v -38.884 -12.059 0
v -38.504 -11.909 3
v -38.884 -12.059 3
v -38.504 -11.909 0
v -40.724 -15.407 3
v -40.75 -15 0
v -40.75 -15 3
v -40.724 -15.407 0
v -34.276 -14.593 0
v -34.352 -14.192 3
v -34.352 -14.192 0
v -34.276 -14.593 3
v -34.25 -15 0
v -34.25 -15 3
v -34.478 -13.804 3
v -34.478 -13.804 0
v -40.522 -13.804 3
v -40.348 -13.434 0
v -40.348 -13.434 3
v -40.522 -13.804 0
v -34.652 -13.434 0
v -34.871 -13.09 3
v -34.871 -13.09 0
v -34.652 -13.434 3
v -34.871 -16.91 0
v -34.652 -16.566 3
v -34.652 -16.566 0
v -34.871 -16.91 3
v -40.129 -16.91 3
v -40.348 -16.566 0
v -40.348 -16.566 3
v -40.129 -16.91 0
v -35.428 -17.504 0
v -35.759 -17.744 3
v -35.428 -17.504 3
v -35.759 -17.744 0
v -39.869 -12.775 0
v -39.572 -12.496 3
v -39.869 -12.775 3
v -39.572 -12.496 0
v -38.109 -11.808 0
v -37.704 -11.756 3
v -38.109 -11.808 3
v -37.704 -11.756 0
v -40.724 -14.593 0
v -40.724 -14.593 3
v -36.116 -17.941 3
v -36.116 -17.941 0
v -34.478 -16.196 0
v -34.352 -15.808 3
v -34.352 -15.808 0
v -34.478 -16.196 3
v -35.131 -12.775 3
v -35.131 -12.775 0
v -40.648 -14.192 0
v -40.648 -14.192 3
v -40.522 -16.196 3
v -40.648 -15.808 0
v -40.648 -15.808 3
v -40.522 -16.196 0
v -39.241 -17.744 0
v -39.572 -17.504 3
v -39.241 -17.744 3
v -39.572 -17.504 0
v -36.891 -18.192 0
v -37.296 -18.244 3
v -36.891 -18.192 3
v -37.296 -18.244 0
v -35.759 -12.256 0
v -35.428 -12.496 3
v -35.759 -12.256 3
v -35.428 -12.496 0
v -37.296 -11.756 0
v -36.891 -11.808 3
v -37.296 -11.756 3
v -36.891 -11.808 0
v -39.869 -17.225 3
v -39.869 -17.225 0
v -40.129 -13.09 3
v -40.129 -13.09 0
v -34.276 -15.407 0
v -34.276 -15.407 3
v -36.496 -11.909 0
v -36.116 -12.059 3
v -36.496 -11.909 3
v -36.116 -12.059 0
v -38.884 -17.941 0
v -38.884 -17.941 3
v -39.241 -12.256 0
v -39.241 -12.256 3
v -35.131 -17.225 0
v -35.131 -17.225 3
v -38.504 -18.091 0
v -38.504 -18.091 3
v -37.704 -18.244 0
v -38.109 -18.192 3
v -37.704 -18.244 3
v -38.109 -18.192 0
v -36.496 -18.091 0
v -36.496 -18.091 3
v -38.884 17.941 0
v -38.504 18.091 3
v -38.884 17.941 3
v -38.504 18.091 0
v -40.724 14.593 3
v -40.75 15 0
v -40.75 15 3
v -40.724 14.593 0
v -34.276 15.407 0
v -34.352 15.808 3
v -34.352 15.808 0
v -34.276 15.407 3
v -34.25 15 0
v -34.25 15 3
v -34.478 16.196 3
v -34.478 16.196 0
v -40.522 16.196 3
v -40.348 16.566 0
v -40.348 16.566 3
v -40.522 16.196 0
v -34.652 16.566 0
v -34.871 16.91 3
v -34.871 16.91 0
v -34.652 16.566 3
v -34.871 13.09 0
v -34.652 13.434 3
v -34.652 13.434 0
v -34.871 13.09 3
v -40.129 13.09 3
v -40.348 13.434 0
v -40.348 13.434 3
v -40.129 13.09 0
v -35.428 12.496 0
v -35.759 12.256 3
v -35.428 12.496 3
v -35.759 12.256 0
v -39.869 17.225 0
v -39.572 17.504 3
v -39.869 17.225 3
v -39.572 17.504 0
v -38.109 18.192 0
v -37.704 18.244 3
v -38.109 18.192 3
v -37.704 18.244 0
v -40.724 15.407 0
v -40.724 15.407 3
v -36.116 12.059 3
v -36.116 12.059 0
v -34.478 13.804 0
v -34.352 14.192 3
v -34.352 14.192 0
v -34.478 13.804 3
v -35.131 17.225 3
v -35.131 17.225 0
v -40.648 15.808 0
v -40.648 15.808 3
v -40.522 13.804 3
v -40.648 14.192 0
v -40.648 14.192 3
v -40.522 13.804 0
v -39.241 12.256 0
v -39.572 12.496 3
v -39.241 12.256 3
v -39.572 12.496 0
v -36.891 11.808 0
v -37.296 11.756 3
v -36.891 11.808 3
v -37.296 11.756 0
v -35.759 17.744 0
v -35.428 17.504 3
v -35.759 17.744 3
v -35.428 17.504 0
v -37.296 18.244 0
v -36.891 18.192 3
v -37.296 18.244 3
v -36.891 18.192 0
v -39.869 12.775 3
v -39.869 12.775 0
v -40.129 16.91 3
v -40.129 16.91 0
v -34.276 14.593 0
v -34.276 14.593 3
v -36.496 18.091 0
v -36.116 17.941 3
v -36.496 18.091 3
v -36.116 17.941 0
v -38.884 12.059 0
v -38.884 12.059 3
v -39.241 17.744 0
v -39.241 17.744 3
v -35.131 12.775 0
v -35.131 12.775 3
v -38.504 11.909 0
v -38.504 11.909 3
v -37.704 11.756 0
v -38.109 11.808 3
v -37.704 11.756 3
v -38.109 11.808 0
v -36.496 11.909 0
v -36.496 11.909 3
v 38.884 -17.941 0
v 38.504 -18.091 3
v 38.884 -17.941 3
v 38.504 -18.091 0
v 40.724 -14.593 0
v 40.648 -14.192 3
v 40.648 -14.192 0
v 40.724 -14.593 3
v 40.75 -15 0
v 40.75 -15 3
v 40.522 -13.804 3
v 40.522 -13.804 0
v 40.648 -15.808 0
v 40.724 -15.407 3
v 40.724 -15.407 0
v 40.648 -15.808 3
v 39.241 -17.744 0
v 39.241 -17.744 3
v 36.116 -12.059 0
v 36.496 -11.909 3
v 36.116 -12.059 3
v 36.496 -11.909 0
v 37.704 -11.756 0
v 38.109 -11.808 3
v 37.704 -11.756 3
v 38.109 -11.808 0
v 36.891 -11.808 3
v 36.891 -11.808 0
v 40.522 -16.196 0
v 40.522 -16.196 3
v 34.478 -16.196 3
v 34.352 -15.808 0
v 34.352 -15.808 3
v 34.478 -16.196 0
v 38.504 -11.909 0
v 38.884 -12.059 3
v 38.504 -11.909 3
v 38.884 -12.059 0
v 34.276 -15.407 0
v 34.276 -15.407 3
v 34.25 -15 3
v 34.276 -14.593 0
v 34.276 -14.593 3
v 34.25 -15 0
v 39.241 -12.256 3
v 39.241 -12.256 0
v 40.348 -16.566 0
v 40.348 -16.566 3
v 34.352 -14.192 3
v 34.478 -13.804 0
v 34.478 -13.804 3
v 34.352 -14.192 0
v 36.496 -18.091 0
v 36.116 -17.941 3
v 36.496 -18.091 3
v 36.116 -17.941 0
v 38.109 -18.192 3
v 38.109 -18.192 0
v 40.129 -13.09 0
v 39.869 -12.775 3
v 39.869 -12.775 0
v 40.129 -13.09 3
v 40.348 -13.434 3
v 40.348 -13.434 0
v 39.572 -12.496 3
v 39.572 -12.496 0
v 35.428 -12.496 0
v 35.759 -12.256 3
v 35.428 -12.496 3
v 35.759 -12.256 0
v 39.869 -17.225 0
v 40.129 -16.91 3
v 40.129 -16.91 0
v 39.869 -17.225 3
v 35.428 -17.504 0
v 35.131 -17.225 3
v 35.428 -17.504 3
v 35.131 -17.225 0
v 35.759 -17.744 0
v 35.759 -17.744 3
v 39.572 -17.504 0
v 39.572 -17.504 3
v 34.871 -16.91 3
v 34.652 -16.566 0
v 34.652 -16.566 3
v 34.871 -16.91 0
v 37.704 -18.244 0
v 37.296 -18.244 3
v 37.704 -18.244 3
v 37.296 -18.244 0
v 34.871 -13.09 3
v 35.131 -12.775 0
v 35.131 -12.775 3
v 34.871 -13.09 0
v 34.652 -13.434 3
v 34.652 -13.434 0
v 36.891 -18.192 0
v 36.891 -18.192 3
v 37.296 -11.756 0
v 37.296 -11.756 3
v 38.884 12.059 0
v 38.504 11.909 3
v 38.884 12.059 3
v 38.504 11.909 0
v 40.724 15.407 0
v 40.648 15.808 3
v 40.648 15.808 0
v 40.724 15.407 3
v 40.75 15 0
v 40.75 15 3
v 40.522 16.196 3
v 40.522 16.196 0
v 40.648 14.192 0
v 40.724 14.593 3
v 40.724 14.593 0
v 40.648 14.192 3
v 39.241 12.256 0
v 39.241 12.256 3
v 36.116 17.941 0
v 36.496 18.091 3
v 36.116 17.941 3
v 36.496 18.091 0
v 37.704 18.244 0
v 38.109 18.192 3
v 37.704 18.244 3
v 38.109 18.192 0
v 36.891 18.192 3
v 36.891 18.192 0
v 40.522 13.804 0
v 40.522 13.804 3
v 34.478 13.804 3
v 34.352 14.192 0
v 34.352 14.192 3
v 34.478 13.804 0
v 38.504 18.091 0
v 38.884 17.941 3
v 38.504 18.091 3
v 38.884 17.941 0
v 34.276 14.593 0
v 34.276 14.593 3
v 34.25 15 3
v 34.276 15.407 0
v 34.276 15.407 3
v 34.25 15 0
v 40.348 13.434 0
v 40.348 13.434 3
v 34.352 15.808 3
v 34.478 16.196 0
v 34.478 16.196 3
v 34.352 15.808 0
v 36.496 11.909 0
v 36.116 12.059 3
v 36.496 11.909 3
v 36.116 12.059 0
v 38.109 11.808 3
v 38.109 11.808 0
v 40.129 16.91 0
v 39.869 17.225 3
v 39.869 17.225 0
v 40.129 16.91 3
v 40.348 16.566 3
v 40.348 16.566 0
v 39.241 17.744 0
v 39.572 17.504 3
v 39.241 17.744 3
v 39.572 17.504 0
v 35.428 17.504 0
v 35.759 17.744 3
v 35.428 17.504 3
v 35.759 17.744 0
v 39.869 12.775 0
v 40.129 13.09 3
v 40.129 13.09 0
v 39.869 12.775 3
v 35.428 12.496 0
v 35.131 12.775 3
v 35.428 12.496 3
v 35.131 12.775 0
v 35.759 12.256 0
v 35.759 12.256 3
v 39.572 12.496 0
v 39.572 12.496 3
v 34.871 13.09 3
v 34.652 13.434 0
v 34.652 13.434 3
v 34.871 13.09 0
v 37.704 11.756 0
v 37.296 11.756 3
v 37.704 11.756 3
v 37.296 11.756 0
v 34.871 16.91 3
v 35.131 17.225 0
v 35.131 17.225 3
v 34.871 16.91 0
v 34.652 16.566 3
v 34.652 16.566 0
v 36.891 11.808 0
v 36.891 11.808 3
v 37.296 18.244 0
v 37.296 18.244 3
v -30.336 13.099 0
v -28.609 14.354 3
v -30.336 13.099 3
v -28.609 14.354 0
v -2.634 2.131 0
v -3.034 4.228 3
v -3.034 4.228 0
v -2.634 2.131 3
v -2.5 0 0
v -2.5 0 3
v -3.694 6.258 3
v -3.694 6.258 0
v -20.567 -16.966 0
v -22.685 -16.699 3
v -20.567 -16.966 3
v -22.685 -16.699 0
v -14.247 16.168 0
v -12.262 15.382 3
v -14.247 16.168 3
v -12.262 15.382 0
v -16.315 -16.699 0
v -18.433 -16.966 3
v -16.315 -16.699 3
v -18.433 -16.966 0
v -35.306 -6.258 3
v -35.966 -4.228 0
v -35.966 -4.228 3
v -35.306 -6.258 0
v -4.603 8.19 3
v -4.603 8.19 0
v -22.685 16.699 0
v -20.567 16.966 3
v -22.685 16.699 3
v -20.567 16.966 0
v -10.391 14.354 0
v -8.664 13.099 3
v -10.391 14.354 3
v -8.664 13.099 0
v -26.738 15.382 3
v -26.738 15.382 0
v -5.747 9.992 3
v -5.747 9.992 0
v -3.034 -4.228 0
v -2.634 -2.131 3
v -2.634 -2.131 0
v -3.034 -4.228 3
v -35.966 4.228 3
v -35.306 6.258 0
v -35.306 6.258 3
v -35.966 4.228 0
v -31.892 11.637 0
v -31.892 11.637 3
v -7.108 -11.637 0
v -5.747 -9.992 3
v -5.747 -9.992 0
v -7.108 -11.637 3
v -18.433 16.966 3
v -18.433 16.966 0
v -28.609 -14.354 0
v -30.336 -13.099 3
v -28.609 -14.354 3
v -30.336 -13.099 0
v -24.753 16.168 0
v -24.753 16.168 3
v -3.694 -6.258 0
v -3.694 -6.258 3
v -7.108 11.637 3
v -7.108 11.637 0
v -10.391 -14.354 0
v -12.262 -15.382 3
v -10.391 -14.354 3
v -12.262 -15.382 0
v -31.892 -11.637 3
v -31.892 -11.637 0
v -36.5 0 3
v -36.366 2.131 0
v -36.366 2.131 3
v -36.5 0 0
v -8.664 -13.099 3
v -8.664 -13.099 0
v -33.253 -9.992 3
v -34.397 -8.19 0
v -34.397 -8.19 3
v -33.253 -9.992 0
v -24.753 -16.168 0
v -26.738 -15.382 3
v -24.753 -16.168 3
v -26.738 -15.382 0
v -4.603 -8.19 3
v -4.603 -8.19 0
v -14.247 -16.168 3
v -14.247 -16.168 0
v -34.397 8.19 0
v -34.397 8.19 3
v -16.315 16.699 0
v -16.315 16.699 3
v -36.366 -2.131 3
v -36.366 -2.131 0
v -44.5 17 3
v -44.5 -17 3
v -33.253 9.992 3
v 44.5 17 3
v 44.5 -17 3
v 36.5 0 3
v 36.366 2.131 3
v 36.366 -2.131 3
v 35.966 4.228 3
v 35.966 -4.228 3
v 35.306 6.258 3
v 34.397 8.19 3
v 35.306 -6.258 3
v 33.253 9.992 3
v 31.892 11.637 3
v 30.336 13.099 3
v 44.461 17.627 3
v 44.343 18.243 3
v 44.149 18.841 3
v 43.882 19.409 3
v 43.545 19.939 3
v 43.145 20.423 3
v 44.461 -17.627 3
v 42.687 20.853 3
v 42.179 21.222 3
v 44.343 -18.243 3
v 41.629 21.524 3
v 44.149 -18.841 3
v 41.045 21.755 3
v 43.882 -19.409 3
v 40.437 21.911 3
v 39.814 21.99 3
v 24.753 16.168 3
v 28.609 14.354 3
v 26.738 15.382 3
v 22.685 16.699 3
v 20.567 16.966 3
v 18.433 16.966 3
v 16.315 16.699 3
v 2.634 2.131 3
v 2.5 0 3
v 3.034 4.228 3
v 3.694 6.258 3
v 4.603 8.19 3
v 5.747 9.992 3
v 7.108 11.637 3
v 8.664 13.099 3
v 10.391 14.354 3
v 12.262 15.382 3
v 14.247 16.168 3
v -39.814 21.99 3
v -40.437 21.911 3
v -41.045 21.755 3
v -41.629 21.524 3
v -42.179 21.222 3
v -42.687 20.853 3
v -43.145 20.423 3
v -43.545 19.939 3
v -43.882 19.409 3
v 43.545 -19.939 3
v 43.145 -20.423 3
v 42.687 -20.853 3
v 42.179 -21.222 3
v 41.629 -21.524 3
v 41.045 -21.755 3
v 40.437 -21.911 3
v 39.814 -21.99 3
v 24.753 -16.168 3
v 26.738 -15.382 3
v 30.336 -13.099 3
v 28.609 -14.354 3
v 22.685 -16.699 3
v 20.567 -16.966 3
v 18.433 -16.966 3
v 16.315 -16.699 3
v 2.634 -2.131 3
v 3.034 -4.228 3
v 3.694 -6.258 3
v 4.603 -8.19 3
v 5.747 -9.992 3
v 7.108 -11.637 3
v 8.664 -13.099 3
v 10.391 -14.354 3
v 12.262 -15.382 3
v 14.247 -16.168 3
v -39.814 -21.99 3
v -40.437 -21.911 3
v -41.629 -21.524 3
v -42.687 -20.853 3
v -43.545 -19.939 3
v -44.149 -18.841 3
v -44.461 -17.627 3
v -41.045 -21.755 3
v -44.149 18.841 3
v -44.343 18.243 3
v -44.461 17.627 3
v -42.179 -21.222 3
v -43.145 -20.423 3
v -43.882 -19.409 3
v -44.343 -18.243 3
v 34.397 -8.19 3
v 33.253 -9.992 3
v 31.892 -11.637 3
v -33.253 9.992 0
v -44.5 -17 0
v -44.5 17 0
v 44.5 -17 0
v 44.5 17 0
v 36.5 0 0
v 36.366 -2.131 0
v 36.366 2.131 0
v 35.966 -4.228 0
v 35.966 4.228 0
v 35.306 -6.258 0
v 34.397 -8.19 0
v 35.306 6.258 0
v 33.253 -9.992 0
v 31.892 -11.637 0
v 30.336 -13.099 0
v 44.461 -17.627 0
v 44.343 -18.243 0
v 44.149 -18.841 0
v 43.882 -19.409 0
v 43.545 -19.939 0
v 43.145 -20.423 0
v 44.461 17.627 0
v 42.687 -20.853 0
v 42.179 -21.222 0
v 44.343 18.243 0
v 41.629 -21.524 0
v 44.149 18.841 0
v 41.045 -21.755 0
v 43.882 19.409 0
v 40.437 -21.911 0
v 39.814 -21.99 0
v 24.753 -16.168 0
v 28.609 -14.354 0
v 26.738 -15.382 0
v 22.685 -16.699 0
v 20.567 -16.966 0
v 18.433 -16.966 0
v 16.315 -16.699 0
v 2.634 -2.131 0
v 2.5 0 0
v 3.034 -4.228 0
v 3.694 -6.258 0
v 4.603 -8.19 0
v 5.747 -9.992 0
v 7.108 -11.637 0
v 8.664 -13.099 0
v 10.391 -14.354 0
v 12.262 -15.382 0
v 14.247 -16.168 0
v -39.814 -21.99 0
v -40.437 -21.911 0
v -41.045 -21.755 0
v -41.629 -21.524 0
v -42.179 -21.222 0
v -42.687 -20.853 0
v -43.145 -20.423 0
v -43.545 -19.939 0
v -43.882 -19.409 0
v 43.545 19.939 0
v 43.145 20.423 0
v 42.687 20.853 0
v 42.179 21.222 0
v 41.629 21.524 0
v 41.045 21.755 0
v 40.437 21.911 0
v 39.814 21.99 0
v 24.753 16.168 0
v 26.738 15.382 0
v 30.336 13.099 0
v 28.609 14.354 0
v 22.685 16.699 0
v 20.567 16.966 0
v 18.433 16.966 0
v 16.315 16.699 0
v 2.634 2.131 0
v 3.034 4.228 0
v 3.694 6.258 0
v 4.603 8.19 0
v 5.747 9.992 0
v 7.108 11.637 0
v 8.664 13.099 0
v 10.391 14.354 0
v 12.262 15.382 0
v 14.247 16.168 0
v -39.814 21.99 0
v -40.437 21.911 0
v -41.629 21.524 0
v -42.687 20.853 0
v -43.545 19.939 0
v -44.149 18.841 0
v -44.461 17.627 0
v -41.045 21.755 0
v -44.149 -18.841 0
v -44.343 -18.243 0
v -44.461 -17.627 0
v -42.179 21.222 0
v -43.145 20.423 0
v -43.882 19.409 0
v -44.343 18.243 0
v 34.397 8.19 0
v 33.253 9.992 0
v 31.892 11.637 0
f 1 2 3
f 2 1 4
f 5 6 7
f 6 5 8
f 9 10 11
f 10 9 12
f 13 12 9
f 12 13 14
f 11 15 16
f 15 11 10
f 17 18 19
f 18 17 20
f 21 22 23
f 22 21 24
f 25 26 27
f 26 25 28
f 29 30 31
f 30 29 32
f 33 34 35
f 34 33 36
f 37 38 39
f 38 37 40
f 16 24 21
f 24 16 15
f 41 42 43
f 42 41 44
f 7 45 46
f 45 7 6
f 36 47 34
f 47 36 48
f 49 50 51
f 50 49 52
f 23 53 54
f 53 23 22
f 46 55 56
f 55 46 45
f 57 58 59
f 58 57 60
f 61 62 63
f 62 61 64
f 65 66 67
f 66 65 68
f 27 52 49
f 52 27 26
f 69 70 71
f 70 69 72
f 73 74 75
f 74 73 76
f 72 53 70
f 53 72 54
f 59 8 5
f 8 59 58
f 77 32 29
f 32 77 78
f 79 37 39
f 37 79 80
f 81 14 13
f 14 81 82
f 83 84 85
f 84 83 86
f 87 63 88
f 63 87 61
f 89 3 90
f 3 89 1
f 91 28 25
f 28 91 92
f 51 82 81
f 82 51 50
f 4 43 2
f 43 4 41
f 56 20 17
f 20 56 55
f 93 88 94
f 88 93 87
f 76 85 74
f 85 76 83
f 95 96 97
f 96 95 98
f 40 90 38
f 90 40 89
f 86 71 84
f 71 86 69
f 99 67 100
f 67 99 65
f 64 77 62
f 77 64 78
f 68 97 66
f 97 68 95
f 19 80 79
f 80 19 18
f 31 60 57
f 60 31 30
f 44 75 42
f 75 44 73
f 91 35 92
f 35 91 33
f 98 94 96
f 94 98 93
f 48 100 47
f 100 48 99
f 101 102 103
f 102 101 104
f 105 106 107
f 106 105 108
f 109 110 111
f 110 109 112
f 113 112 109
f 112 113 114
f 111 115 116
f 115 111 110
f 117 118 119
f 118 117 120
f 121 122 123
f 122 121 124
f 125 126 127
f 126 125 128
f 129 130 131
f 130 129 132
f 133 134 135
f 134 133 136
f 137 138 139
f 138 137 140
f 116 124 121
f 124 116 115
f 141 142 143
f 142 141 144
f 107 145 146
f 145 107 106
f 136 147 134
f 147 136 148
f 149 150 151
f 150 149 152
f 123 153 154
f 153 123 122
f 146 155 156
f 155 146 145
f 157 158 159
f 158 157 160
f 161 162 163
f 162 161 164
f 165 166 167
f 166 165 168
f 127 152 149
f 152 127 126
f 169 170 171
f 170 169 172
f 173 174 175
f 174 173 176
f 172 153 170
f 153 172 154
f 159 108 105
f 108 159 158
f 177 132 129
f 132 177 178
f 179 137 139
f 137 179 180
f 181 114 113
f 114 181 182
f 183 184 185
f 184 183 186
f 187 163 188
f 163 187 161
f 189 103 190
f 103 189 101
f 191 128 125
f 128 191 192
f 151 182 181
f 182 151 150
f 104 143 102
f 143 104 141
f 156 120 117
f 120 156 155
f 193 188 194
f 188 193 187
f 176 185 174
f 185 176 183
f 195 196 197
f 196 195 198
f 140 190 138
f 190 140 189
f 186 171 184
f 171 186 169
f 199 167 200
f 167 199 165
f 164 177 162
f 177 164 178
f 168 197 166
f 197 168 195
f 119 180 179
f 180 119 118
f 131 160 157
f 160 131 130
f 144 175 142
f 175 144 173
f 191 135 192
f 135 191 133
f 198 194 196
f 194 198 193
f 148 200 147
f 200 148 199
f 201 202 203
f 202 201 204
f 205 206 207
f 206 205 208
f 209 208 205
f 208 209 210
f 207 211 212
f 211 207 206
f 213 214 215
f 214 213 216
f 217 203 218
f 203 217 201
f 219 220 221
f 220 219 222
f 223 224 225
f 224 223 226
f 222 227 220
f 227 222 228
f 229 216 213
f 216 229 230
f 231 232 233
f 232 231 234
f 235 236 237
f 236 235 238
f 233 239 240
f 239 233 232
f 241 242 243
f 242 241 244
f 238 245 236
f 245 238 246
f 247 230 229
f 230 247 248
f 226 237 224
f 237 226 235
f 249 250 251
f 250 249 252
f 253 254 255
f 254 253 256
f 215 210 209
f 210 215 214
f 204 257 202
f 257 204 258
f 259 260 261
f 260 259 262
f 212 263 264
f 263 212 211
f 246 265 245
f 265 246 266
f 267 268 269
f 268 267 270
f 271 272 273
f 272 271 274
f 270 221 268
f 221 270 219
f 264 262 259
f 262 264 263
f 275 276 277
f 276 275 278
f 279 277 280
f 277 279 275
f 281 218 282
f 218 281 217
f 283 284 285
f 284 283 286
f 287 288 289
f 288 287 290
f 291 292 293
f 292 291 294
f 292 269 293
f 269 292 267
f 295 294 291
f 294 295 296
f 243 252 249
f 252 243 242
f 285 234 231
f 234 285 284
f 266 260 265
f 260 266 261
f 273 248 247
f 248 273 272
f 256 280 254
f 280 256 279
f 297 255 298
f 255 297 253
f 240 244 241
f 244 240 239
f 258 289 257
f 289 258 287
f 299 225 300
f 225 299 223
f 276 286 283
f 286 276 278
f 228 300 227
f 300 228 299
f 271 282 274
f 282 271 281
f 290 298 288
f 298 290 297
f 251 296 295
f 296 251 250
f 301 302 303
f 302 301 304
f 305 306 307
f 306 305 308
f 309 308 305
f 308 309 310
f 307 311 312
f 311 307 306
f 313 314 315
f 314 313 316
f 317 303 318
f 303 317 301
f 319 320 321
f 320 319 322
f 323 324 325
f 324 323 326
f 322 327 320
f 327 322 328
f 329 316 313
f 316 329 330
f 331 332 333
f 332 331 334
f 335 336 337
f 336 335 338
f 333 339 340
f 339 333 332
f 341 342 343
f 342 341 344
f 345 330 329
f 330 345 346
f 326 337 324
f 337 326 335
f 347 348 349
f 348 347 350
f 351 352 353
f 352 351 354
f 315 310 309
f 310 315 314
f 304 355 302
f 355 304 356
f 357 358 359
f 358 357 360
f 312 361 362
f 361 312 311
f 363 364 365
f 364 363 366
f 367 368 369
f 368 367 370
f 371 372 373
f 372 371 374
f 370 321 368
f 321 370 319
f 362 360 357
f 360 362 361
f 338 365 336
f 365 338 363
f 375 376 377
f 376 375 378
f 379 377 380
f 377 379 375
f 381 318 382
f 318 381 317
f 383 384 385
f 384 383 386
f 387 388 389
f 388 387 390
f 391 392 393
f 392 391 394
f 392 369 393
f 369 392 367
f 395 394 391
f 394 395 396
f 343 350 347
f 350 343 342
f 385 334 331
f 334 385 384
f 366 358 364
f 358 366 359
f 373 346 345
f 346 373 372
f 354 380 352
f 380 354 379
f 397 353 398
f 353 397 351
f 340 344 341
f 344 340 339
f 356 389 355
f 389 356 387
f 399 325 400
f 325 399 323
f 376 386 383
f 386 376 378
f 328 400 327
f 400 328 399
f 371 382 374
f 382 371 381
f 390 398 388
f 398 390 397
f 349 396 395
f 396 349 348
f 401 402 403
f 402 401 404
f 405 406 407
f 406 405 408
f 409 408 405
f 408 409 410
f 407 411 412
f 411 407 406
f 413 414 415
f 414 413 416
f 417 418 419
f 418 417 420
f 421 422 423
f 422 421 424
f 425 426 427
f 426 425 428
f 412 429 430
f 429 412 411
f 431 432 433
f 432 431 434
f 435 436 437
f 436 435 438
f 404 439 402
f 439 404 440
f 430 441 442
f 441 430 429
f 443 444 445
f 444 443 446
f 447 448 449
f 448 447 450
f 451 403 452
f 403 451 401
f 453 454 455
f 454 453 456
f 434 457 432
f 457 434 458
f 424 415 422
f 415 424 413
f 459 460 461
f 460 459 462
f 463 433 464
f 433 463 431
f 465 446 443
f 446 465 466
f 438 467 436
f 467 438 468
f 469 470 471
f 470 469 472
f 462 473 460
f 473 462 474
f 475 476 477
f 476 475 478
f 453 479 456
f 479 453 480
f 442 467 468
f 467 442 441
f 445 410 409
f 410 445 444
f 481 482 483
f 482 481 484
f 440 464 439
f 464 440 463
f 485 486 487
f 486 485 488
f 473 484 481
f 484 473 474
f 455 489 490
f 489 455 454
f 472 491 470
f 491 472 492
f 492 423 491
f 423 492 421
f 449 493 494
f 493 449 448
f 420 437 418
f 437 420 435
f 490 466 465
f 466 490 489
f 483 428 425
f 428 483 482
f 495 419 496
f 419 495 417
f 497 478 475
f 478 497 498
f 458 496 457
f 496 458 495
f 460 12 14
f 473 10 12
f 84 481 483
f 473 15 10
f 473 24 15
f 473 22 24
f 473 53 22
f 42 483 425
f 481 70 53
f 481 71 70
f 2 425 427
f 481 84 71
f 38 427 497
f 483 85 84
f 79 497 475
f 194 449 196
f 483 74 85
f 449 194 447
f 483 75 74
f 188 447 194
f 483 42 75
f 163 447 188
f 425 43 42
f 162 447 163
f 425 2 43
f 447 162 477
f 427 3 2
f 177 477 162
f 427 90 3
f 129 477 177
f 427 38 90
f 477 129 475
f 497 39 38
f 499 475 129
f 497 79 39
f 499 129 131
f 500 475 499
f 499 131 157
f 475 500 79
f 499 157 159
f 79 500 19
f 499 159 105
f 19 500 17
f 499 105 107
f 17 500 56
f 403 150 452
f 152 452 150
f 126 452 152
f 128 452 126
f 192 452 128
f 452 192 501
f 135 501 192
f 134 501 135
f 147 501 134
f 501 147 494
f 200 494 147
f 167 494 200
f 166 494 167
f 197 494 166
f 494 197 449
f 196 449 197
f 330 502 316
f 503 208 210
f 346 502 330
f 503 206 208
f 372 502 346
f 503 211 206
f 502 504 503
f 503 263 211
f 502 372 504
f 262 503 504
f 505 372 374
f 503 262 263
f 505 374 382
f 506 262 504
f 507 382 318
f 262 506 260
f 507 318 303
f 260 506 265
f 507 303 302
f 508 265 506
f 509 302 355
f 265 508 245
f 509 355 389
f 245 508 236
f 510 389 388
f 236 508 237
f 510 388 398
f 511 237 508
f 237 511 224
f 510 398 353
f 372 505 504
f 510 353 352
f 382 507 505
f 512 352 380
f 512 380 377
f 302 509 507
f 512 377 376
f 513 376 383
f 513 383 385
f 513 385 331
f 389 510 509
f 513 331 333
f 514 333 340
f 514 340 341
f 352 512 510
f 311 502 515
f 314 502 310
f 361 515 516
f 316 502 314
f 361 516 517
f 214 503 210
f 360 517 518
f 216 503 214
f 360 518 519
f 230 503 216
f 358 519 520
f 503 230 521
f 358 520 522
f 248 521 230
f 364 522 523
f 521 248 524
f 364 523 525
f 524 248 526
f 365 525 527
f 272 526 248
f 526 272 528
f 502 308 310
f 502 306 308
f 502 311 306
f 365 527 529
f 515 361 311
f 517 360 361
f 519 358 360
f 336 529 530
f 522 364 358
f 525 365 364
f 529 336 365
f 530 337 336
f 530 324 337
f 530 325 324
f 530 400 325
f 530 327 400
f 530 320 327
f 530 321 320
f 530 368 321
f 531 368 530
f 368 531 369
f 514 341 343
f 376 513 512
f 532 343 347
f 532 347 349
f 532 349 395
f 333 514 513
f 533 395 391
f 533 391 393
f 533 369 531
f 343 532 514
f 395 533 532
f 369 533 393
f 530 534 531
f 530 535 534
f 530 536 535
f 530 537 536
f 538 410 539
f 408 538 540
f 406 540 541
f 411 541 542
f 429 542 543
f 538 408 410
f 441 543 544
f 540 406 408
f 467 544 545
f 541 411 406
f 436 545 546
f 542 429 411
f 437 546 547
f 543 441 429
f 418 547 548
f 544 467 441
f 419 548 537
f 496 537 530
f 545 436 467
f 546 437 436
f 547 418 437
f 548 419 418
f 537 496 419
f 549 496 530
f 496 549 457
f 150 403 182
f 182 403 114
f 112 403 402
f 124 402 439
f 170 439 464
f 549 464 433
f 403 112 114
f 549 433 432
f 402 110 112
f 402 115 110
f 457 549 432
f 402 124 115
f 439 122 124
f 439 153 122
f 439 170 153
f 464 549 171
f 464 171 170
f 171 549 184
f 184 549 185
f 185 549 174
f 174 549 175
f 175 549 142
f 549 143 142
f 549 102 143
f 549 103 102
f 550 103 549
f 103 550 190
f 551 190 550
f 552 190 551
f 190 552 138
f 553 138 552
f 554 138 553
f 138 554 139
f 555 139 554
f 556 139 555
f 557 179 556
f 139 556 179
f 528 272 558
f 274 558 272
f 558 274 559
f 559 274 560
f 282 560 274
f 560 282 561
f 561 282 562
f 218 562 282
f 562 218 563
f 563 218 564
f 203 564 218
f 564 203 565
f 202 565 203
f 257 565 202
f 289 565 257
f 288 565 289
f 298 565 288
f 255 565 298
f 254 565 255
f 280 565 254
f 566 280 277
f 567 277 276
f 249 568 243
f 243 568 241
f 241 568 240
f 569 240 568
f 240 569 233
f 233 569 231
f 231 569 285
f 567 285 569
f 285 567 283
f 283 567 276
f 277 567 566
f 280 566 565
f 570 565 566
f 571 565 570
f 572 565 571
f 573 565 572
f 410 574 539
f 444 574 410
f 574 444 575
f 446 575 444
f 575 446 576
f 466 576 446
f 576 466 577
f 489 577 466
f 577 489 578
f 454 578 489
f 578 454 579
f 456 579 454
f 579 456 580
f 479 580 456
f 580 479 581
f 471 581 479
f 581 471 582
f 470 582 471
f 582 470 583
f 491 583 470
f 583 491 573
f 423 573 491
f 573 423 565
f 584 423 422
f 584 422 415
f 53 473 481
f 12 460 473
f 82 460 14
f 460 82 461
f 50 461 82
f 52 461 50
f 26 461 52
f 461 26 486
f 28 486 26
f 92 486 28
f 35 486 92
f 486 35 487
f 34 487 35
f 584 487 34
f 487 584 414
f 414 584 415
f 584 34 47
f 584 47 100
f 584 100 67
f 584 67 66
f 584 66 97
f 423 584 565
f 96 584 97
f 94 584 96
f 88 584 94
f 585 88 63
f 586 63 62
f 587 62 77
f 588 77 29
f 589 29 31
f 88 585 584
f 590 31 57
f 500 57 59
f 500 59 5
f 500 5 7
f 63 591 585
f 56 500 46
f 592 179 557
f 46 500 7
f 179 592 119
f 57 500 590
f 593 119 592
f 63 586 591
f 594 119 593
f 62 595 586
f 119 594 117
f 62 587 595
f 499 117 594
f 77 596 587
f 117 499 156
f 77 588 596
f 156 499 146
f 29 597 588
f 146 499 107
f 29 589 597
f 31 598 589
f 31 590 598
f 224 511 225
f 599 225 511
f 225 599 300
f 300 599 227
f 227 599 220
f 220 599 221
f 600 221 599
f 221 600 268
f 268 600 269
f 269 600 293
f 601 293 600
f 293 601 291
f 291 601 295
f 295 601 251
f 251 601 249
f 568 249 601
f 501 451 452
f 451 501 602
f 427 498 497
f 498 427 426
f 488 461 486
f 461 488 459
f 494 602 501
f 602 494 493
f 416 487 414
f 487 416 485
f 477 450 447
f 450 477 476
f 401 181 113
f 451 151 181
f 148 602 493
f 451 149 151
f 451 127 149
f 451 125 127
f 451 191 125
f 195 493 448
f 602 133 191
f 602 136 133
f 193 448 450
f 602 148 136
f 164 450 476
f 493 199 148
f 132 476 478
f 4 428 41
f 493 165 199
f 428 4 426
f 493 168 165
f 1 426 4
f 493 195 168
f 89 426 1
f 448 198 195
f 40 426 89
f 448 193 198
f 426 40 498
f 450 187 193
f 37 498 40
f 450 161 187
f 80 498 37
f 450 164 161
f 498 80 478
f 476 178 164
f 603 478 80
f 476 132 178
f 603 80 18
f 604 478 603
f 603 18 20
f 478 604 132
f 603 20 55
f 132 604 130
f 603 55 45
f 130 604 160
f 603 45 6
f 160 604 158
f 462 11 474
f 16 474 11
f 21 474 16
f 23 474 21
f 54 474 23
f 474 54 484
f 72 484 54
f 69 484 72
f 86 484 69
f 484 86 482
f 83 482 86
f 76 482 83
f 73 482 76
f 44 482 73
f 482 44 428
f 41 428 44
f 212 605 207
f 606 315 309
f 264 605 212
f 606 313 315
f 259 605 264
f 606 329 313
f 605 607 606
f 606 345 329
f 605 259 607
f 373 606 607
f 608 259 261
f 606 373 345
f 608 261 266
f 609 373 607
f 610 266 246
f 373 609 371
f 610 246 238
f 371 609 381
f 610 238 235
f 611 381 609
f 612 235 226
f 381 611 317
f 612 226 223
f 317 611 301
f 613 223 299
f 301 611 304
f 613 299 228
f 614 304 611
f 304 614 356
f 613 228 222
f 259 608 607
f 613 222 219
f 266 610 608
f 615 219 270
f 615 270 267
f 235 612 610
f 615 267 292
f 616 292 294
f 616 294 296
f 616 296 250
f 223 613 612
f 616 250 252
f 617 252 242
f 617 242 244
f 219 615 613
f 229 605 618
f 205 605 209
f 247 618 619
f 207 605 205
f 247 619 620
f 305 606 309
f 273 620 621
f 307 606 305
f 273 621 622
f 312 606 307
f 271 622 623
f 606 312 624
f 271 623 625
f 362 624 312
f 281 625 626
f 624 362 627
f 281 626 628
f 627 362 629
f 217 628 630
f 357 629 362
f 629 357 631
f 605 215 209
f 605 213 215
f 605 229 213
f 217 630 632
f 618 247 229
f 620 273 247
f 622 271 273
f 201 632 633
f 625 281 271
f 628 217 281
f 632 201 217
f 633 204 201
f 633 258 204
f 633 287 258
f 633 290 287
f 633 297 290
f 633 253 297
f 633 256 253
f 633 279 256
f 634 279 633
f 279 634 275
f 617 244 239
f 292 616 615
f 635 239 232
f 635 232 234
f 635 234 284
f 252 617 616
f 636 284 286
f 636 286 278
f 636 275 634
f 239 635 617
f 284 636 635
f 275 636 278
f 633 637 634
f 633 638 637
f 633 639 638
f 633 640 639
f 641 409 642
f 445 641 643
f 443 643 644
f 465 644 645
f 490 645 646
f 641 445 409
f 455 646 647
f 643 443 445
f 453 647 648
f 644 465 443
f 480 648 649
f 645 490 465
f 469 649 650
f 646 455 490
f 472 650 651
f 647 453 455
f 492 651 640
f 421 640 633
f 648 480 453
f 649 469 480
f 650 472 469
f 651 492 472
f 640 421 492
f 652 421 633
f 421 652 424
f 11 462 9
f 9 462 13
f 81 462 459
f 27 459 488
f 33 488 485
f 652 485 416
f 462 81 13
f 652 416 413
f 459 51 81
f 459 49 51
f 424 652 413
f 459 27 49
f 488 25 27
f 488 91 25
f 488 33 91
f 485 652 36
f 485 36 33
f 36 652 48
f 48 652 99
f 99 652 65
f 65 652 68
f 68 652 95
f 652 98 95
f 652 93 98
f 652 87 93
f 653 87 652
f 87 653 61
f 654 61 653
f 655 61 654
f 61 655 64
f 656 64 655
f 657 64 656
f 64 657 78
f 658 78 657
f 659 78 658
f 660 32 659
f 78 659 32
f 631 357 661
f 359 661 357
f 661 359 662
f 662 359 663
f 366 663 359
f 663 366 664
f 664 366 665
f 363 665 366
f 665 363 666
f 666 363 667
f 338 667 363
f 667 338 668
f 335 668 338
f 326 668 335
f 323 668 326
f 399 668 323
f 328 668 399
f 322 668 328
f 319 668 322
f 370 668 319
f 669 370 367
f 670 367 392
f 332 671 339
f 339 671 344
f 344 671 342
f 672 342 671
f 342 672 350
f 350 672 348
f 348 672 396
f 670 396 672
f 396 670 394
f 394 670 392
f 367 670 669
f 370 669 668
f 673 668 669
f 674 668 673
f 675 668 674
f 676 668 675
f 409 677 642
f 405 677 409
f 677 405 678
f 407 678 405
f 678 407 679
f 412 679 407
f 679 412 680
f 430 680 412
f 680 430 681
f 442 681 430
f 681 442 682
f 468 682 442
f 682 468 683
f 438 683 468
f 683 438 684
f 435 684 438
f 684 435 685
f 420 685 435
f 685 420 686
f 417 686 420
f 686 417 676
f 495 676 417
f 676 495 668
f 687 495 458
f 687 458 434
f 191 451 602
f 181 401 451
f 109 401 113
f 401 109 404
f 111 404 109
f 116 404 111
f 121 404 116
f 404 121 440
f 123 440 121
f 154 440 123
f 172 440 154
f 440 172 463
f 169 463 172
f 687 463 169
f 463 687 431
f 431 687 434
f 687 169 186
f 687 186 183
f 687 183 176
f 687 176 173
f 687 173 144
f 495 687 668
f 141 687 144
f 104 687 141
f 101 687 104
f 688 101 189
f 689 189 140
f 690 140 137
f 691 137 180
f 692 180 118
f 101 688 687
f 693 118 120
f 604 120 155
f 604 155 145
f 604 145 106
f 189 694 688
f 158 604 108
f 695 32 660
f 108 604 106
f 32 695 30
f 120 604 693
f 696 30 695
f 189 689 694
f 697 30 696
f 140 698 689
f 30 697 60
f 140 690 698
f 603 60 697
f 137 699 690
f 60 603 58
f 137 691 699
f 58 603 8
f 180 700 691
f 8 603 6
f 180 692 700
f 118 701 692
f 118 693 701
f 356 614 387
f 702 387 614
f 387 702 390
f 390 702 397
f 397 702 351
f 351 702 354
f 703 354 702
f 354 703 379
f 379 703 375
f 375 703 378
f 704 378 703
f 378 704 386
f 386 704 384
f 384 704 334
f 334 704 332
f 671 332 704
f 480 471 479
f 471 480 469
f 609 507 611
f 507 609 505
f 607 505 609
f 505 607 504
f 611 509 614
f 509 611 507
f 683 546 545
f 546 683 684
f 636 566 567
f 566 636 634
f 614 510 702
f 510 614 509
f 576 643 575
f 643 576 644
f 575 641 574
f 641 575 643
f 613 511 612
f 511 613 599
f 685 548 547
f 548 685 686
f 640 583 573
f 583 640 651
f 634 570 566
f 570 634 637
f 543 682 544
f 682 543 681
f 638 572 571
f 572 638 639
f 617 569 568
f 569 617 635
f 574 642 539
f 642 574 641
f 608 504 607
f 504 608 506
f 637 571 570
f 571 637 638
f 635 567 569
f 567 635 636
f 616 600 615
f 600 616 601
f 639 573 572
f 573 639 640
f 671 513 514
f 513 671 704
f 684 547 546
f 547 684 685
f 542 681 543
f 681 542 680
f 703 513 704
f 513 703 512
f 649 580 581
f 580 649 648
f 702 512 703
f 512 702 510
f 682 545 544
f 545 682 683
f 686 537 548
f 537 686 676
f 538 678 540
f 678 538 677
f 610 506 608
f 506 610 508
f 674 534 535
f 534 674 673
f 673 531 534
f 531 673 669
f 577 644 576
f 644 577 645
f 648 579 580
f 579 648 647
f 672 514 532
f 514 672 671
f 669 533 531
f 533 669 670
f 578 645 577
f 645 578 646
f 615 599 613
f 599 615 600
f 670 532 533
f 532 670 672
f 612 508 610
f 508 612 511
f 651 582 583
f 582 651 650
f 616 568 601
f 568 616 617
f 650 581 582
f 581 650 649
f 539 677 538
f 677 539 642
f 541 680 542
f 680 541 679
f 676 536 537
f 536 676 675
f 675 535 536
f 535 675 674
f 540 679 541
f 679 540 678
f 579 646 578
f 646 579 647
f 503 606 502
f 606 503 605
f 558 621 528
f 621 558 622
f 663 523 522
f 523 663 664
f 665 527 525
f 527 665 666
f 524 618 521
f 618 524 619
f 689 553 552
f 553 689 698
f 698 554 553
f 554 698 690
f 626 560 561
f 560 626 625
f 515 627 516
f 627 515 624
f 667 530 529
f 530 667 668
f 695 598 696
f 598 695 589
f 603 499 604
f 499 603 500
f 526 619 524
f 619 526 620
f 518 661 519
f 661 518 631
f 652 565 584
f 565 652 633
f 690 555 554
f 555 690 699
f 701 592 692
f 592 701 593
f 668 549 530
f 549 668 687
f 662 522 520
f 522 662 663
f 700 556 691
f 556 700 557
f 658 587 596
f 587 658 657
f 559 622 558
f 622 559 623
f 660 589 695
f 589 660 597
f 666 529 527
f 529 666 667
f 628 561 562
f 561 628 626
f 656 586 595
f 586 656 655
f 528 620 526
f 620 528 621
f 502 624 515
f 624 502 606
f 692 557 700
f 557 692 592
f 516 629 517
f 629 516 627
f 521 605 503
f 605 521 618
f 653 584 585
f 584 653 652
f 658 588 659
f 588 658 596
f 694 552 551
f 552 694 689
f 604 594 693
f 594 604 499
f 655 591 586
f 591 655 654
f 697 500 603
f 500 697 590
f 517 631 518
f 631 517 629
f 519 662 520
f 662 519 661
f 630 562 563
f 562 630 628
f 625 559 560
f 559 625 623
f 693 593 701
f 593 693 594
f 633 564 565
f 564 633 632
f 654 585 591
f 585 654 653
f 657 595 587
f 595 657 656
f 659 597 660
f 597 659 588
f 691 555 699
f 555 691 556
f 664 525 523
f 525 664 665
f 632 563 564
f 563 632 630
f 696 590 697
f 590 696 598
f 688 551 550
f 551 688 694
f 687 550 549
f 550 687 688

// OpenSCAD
$fn = 50;


difference() {
	union() {
		hull() {
			translate(v = [-39.5000000000, 17.0000000000, 0]) {
				cylinder(h = 3, r = 5);
			}
			translate(v = [39.5000000000, 17.0000000000, 0]) {
				cylinder(h = 3, r = 5);
			}
			translate(v = [-39.5000000000, -17.0000000000, 0]) {
				cylinder(h = 3, r = 5);
			}
			translate(v = [39.5000000000, -17.0000000000, 0]) {
				cylinder(h = 3, r = 5);
			}
		}
	}
	union() {
		#translate(v = [-37.5000000000, -15.0000000000, -100.0000000000]) {
			cylinder(h = 200, r = 3.2500000000);
		}
		#translate(v = [-37.5000000000, 15.0000000000, -100.0000000000]) {
			cylinder(h = 200, r = 3.2500000000);
		}
		#translate(v = [37.5000000000, -15.0000000000, -100.0000000000]) {
			cylinder(h = 200, r = 3.2500000000);
		}
		#translate(v = [37.5000000000, 15.0000000000, -100.0000000000]) {
			cylinder(h = 200, r = 3.2500000000);
		}
		#translate(v = [-19.5000000000, 0, 0]) {
			cylinder(h = 3, r = 17.0000000000);
		}
		#translate(v = [19.5000000000, 0, 0]) {
			cylinder(h = 3, r = 17.0000000000);
		}
	}
}
